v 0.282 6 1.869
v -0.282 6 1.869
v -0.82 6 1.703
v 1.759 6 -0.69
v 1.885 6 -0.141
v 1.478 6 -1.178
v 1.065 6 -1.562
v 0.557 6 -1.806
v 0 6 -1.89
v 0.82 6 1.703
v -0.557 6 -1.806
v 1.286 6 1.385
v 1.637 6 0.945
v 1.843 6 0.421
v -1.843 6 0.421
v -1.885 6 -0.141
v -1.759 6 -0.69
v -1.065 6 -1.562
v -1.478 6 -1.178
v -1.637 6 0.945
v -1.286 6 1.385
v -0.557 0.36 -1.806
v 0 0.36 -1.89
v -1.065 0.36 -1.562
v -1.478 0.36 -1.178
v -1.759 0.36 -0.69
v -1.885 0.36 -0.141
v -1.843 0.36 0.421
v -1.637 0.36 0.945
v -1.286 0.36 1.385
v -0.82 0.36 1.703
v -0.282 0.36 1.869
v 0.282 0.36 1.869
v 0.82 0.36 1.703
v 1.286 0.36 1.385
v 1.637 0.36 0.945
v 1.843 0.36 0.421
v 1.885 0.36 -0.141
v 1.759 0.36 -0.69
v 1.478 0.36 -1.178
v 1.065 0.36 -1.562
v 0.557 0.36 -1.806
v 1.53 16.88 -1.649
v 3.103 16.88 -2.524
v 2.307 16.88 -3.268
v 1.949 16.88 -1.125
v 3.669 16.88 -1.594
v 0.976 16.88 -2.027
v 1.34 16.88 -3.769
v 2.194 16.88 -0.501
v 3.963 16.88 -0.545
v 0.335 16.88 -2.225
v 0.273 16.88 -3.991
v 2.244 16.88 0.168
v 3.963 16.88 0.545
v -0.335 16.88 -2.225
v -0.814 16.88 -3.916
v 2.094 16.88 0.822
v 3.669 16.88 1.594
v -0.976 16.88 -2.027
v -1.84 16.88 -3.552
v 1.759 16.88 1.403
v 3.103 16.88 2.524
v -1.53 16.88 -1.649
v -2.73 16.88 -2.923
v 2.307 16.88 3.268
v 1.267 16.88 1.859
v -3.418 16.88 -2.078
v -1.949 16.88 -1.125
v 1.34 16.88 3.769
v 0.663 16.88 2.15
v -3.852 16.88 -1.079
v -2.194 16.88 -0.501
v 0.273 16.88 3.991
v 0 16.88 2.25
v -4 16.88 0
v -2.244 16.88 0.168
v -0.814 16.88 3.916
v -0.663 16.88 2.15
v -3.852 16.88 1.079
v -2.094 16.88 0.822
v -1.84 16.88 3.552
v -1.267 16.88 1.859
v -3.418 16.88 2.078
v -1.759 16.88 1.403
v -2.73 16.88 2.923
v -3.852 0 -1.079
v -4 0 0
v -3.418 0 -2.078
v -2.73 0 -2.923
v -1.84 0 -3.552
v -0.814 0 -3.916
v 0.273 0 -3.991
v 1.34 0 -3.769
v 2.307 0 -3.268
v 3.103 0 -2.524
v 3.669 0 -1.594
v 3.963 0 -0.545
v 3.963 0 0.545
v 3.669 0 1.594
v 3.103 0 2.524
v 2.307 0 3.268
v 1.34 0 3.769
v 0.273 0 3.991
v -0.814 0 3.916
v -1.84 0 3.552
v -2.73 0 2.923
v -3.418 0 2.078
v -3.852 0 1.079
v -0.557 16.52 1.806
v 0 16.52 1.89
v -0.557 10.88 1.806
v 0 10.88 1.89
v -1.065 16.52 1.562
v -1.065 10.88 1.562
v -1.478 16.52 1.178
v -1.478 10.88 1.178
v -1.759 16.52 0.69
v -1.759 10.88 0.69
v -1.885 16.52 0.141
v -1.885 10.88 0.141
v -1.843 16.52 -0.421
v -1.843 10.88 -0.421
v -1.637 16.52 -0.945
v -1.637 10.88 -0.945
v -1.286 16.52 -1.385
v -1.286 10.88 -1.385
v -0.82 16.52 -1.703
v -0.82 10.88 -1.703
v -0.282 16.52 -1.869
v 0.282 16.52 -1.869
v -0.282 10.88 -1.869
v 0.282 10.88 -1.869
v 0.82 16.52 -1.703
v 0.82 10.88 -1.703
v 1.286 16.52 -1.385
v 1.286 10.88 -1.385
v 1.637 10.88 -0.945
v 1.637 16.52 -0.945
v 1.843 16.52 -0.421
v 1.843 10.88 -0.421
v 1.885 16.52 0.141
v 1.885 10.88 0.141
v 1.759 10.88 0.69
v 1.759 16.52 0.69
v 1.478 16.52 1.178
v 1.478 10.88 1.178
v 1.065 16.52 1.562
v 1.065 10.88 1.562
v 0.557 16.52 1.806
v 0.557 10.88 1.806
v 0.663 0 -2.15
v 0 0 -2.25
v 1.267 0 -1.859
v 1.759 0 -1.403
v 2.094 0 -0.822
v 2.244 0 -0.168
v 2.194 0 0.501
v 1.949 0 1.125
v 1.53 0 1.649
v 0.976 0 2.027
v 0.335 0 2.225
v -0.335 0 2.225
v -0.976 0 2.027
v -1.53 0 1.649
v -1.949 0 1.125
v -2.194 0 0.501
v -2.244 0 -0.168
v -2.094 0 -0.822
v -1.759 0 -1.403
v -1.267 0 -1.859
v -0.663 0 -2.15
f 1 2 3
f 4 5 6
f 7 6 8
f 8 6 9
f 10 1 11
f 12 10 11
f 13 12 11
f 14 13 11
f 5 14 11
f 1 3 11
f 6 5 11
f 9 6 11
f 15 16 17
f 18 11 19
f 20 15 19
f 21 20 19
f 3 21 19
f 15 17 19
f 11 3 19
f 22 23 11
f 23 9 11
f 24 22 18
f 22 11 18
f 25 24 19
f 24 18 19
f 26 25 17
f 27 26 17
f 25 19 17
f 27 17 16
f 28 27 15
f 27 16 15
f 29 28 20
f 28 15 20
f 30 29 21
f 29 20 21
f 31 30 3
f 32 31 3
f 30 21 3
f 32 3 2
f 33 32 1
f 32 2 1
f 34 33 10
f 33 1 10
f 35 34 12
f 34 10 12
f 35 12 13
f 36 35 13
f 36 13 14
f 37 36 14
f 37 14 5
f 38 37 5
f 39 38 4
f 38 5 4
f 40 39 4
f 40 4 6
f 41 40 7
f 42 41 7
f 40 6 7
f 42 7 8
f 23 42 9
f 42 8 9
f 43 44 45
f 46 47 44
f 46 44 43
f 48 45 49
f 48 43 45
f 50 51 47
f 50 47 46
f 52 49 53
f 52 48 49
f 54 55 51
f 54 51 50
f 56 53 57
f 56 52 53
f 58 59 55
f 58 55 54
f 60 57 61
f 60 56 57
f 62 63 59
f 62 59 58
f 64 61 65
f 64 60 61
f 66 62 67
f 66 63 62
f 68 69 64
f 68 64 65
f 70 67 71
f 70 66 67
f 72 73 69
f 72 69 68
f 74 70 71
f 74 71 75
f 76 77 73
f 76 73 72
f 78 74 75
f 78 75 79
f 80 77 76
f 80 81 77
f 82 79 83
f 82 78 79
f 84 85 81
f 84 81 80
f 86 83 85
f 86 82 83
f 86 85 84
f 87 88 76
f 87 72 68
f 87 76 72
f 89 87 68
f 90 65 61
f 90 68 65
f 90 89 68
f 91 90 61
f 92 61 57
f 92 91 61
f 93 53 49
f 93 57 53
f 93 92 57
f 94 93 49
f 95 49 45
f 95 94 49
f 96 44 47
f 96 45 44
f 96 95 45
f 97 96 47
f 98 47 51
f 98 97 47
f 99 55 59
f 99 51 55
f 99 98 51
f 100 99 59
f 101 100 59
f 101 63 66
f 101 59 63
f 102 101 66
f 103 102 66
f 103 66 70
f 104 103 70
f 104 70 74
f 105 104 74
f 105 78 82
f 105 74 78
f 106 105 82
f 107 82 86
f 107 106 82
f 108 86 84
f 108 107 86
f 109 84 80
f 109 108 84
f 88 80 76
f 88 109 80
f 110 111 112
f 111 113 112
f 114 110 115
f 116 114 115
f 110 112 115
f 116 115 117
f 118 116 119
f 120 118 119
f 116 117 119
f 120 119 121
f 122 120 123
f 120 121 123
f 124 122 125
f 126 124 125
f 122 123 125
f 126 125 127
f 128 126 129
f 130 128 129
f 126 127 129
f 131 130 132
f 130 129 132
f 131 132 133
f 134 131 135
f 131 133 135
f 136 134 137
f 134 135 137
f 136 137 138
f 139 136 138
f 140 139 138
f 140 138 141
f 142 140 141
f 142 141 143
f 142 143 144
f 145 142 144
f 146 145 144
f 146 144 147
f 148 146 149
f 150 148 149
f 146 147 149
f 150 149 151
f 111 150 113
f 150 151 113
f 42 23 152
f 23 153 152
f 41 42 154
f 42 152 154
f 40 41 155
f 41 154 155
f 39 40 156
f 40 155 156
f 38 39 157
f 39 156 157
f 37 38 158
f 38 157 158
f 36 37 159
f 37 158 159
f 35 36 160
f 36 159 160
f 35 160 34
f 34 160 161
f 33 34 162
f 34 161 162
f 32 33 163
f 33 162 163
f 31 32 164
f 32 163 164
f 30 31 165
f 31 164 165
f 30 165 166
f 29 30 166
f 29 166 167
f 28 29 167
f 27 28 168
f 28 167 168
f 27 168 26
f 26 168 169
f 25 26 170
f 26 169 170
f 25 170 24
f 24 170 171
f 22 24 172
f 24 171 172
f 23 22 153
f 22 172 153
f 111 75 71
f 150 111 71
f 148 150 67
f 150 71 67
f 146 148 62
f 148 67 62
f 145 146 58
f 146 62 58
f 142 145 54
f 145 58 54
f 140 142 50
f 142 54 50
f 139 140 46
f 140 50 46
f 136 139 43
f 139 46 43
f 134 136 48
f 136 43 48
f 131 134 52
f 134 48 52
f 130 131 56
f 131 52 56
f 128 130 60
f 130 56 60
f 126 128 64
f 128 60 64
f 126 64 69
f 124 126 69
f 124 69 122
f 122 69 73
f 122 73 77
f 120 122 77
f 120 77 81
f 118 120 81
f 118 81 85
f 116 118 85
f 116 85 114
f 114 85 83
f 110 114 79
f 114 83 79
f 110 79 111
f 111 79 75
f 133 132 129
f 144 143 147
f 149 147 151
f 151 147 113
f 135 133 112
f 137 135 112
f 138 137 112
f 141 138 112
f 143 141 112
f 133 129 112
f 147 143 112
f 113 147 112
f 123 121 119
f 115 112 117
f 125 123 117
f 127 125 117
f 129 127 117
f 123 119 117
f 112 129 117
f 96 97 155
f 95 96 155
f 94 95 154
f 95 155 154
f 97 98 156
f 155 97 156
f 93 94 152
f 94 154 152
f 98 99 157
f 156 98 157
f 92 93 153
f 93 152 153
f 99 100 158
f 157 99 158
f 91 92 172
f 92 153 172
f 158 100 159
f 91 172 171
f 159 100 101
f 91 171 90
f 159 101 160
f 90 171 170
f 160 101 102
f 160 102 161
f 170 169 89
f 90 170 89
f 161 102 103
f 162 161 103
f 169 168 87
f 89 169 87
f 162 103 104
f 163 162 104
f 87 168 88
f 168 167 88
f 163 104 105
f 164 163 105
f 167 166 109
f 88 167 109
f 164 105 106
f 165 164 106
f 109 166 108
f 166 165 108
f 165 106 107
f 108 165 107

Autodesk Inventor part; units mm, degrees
ref_plane "YZ Plane" through (0, 0, 0) normal (1, 0, 0) x (0, 1, 0)
ref_plane "XZ Plane" through (0, 0, 0) normal (0, 1, 0) x (-1, 0, 0)
ref_plane "XY Plane" through (0, 0, 0) normal (0, 0, 1) x (1, 0, 0)
sketch "Sketch1" plane through (0, 0, 0) normal (0, 1, 0) x (-1, 0, 0)
  circle A0 centre (0, 0) radius 4
  dimension "d0" = 8
extrude "Extrusion1" add sketch "Sketch1" along normal blind 16.88
sketch "Sketch2" plane through (0, 16.88, 0) normal (0, 1, 0) x (1, 0, 0)
  point P0 (0, 0)
sketch "Sketch3" plane through (0, 0, 0) normal (0, -1, 0) x (1, 0, 0)
  point P0 (0, 0)
hole "Hole1" at (0, 0, 0) direction (0, 1, 0) diameter 3.78 depth 6 countersink diameter 4.5 countersink angle 90
hole "Hole2" at (0, 16.88, 0) direction (0, -1, 0) diameter 3.78 depth 6 countersink diameter 4.5 countersink angle 90
properties part number "Button Spacer"
